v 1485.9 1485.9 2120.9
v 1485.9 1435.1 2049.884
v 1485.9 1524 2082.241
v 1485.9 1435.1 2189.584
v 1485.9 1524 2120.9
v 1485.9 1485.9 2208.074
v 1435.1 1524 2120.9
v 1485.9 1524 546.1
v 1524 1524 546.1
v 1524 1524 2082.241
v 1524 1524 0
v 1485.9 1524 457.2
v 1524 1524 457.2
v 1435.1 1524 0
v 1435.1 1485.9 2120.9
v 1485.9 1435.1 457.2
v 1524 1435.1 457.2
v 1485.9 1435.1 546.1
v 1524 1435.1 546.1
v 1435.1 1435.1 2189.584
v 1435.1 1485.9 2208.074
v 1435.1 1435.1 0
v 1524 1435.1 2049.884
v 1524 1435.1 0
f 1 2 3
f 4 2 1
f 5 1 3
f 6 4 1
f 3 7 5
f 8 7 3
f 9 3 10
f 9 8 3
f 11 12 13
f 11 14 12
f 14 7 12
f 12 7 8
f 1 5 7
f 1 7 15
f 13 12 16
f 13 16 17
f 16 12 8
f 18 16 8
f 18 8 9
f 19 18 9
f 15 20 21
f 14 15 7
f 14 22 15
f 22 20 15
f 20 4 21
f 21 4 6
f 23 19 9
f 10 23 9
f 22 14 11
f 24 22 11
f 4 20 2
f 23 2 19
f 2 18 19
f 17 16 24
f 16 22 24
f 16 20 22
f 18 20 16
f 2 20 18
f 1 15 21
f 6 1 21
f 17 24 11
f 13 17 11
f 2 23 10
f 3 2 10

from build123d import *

# Parameters (mm, degrees)
BOX006_W        = 88.9
BOX006_H        = 88.9
BOX006_DEPTH    = 2438.4
SKETCH003_W     = 38.1
SKETCH003_H     = 88.9
POCKET003_DEPTH = 88.9010000032
POCKET008_DEPTH = 88.901
POCKET011_DEPTH = 38.1
SKETCH019_W     = 38.1
SKETCH019_H     = 101.6
POCKET016_DEPTH = 88.901


with BuildPart() as part:
    # Box006 → Box006 (new body)
    with BuildSketch(Plane(origin=(1435.1, 1435.1, 0), x_dir=(1, 0, 0), z_dir=(0, 0, 1))):
        with Locations((44.45, 44.45)):
            Rectangle(BOX006_W, BOX006_H)
    extrude(amount=BOX006_DEPTH)

    # Sketch003 → Pocket003 (cut, through all)
    with BuildSketch(Plane(origin=(1435.1, 1435.1, 0), x_dir=(1, 0, 0), z_dir=(0, -1, 0))):
        with Locations((69.85, 501.65)):
            Rectangle(SKETCH003_W, SKETCH003_H)
    extrude(amount=-POCKET003_DEPTH, mode=Mode.SUBTRACT)

    # Sketch009 → Pocket008 (cut, through all)
    with BuildSketch(Plane(origin=(1524, 1435.1, 0), x_dir=(0, 1, 0), z_dir=(1, 0, 0))):
        Polygon((88.9, 2221.9412), (88.9, 2438.4), (0, 2438.4), (0, 2189.5842461737), align=None)
    extrude(amount=-POCKET008_DEPTH, mode=Mode.SUBTRACT)

    # Sketch012 → Pocket011 (cut)
    with BuildSketch(Plane(origin=(1524, 1435.1, 0), x_dir=(0, 1, 0), z_dir=(1, 0, 0))):
        Polygon((0, 2189.5842461737), (0, 2049.8842461737), (88.9, 2082.2412), (88.9, 2221.9412), align=None)
    extrude(amount=-POCKET011_DEPTH, mode=Mode.SUBTRACT)

    # Sketch019 → Pocket016 (cut, through all)
    with BuildSketch(Plane(origin=(1435.1, 1435.1, 0), x_dir=(0, -1, 0), z_dir=(-1, 0, 0))):
        with Locations((-69.85, 2171.7)):
            Rectangle(SKETCH019_W, SKETCH019_H)
    extrude(amount=-POCKET016_DEPTH, mode=Mode.SUBTRACT)


solid = part.part
